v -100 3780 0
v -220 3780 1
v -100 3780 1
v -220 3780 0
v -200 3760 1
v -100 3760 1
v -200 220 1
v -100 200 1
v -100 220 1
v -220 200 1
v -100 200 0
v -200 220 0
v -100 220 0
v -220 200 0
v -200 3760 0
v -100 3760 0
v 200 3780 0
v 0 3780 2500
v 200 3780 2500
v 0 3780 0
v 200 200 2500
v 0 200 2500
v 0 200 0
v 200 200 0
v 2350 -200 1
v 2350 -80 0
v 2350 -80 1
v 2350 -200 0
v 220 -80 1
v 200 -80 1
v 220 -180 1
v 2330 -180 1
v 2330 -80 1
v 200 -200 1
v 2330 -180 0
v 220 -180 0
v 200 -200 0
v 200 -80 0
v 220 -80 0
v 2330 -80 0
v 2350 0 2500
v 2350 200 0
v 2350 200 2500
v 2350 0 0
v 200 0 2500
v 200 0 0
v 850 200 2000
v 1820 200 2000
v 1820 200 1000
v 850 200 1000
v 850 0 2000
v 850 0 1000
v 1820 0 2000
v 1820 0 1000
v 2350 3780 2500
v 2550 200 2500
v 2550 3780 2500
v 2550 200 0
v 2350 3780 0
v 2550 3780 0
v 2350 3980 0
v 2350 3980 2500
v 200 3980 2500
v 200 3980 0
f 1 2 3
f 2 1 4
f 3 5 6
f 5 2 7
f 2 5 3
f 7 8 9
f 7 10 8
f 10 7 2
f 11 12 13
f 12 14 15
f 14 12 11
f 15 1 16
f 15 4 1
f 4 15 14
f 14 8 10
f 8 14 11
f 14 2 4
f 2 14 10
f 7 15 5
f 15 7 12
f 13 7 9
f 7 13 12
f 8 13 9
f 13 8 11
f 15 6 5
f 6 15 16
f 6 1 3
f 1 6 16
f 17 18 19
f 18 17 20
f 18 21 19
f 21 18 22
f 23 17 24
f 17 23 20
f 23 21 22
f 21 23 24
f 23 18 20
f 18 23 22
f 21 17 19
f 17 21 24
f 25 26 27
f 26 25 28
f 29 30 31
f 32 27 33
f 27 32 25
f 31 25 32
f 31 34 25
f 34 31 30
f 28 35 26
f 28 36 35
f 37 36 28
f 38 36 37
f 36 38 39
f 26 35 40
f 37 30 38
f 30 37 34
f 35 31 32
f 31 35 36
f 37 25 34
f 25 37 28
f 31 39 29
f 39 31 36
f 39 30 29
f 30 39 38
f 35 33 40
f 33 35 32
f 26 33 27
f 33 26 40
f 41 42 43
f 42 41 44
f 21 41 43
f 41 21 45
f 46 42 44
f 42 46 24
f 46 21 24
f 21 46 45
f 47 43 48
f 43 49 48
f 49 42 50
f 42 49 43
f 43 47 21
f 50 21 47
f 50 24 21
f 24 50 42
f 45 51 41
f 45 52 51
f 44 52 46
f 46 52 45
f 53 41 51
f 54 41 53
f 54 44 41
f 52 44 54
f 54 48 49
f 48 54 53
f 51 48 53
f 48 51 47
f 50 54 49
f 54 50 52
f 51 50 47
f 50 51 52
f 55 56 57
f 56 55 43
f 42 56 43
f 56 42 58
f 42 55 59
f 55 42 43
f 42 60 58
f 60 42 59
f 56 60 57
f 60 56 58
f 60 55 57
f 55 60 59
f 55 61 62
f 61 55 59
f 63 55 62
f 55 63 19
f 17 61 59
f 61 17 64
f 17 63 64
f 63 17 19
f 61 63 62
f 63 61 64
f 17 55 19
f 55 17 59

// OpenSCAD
// file: dimension.scad
module dimension(length, width=20, height=1, left_marker=true, right_marker=true, marker_length=120, marker_width=20, label="above", textsize=150) {
  module marker() {
    cube([marker_width, marker_length, height]);
  }

  verticalalign = label == "below" ? "top" : "bottom";
  verticaloffset = label == "below" ? -50 : 50;
  verticalmarkeroffset = label == "below" ? 0 : marker_width-marker_length;

  //line
  cube([length, width, height]);
  //left end marker
  translate([0, verticalmarkeroffset, 0]) marker();
  //right end marker
  translate([length-marker_width, verticalmarkeroffset, 0]) marker();
  //text
  translate([length/2, verticaloffset, 0]) text(text=str(length/10, "cm"), size=textsize, halign="center", valign=verticalalign);
}
// main file
use <dimension.scad>;

DIMLINE_THICKNESS = 200;
WALL_THICKNESS = 200;
ROOM_HEIGHT = 2500;

KITCHEN_WIDTH = 2150;
KITCHEN_LENGTH = 3580;
KITCHEN_HEIGHT = ROOM_HEIGHT;

DOOR_WIDTH = 600;
DOOR_HEIGHT = 2000;

WINDOW_WIDTH = 970;
WINDOW_HEIGHT = 1000;

module kitchen() {
  module doorcut() {
    cube([DOOR_WIDTH, WALL_THICKNESS*3, DOOR_HEIGHT]);
  }
  module windowcut() {
    cube([WINDOW_WIDTH, WALL_THICKNESS*3, WINDOW_HEIGHT]);
  }
  module wall(length, height=ROOM_HEIGHT, offset=20, labelpos, withdim="true") {
    cube([length, WALL_THICKNESS, height]);
    if (withdim=="true") {
      overunder = labelpos == "below" ? -200 : WALL_THICKNESS + 200;
      translate([0, overunder, 0]) dimension(length=length, label=labelpos);
    }
  };
  // left wall
  translate([WALL_THICKNESS, WALL_THICKNESS, 0]) rotate([0, 0, 90]) wall(length=KITCHEN_LENGTH);
  // bottom wall
  translate([WALL_THICKNESS, 0, 0]) {
    difference() {
      wall(length=KITCHEN_WIDTH, labelpos="below");
      translate([650, -WALL_THICKNESS, 1000]) windowcut();
    }
  }
  // right wall
  translate([KITCHEN_WIDTH + WALL_THICKNESS*2, WALL_THICKNESS, 0]) rotate([0, 0, 90]) wall(length=KITCHEN_LENGTH, withdim="false");
  // top wall
  translate([WALL_THICKNESS, WALL_THICKNESS + KITCHEN_LENGTH, 0]) wall(length=KITCHEN_WIDTH, withdim="false");
}

kitchen();
